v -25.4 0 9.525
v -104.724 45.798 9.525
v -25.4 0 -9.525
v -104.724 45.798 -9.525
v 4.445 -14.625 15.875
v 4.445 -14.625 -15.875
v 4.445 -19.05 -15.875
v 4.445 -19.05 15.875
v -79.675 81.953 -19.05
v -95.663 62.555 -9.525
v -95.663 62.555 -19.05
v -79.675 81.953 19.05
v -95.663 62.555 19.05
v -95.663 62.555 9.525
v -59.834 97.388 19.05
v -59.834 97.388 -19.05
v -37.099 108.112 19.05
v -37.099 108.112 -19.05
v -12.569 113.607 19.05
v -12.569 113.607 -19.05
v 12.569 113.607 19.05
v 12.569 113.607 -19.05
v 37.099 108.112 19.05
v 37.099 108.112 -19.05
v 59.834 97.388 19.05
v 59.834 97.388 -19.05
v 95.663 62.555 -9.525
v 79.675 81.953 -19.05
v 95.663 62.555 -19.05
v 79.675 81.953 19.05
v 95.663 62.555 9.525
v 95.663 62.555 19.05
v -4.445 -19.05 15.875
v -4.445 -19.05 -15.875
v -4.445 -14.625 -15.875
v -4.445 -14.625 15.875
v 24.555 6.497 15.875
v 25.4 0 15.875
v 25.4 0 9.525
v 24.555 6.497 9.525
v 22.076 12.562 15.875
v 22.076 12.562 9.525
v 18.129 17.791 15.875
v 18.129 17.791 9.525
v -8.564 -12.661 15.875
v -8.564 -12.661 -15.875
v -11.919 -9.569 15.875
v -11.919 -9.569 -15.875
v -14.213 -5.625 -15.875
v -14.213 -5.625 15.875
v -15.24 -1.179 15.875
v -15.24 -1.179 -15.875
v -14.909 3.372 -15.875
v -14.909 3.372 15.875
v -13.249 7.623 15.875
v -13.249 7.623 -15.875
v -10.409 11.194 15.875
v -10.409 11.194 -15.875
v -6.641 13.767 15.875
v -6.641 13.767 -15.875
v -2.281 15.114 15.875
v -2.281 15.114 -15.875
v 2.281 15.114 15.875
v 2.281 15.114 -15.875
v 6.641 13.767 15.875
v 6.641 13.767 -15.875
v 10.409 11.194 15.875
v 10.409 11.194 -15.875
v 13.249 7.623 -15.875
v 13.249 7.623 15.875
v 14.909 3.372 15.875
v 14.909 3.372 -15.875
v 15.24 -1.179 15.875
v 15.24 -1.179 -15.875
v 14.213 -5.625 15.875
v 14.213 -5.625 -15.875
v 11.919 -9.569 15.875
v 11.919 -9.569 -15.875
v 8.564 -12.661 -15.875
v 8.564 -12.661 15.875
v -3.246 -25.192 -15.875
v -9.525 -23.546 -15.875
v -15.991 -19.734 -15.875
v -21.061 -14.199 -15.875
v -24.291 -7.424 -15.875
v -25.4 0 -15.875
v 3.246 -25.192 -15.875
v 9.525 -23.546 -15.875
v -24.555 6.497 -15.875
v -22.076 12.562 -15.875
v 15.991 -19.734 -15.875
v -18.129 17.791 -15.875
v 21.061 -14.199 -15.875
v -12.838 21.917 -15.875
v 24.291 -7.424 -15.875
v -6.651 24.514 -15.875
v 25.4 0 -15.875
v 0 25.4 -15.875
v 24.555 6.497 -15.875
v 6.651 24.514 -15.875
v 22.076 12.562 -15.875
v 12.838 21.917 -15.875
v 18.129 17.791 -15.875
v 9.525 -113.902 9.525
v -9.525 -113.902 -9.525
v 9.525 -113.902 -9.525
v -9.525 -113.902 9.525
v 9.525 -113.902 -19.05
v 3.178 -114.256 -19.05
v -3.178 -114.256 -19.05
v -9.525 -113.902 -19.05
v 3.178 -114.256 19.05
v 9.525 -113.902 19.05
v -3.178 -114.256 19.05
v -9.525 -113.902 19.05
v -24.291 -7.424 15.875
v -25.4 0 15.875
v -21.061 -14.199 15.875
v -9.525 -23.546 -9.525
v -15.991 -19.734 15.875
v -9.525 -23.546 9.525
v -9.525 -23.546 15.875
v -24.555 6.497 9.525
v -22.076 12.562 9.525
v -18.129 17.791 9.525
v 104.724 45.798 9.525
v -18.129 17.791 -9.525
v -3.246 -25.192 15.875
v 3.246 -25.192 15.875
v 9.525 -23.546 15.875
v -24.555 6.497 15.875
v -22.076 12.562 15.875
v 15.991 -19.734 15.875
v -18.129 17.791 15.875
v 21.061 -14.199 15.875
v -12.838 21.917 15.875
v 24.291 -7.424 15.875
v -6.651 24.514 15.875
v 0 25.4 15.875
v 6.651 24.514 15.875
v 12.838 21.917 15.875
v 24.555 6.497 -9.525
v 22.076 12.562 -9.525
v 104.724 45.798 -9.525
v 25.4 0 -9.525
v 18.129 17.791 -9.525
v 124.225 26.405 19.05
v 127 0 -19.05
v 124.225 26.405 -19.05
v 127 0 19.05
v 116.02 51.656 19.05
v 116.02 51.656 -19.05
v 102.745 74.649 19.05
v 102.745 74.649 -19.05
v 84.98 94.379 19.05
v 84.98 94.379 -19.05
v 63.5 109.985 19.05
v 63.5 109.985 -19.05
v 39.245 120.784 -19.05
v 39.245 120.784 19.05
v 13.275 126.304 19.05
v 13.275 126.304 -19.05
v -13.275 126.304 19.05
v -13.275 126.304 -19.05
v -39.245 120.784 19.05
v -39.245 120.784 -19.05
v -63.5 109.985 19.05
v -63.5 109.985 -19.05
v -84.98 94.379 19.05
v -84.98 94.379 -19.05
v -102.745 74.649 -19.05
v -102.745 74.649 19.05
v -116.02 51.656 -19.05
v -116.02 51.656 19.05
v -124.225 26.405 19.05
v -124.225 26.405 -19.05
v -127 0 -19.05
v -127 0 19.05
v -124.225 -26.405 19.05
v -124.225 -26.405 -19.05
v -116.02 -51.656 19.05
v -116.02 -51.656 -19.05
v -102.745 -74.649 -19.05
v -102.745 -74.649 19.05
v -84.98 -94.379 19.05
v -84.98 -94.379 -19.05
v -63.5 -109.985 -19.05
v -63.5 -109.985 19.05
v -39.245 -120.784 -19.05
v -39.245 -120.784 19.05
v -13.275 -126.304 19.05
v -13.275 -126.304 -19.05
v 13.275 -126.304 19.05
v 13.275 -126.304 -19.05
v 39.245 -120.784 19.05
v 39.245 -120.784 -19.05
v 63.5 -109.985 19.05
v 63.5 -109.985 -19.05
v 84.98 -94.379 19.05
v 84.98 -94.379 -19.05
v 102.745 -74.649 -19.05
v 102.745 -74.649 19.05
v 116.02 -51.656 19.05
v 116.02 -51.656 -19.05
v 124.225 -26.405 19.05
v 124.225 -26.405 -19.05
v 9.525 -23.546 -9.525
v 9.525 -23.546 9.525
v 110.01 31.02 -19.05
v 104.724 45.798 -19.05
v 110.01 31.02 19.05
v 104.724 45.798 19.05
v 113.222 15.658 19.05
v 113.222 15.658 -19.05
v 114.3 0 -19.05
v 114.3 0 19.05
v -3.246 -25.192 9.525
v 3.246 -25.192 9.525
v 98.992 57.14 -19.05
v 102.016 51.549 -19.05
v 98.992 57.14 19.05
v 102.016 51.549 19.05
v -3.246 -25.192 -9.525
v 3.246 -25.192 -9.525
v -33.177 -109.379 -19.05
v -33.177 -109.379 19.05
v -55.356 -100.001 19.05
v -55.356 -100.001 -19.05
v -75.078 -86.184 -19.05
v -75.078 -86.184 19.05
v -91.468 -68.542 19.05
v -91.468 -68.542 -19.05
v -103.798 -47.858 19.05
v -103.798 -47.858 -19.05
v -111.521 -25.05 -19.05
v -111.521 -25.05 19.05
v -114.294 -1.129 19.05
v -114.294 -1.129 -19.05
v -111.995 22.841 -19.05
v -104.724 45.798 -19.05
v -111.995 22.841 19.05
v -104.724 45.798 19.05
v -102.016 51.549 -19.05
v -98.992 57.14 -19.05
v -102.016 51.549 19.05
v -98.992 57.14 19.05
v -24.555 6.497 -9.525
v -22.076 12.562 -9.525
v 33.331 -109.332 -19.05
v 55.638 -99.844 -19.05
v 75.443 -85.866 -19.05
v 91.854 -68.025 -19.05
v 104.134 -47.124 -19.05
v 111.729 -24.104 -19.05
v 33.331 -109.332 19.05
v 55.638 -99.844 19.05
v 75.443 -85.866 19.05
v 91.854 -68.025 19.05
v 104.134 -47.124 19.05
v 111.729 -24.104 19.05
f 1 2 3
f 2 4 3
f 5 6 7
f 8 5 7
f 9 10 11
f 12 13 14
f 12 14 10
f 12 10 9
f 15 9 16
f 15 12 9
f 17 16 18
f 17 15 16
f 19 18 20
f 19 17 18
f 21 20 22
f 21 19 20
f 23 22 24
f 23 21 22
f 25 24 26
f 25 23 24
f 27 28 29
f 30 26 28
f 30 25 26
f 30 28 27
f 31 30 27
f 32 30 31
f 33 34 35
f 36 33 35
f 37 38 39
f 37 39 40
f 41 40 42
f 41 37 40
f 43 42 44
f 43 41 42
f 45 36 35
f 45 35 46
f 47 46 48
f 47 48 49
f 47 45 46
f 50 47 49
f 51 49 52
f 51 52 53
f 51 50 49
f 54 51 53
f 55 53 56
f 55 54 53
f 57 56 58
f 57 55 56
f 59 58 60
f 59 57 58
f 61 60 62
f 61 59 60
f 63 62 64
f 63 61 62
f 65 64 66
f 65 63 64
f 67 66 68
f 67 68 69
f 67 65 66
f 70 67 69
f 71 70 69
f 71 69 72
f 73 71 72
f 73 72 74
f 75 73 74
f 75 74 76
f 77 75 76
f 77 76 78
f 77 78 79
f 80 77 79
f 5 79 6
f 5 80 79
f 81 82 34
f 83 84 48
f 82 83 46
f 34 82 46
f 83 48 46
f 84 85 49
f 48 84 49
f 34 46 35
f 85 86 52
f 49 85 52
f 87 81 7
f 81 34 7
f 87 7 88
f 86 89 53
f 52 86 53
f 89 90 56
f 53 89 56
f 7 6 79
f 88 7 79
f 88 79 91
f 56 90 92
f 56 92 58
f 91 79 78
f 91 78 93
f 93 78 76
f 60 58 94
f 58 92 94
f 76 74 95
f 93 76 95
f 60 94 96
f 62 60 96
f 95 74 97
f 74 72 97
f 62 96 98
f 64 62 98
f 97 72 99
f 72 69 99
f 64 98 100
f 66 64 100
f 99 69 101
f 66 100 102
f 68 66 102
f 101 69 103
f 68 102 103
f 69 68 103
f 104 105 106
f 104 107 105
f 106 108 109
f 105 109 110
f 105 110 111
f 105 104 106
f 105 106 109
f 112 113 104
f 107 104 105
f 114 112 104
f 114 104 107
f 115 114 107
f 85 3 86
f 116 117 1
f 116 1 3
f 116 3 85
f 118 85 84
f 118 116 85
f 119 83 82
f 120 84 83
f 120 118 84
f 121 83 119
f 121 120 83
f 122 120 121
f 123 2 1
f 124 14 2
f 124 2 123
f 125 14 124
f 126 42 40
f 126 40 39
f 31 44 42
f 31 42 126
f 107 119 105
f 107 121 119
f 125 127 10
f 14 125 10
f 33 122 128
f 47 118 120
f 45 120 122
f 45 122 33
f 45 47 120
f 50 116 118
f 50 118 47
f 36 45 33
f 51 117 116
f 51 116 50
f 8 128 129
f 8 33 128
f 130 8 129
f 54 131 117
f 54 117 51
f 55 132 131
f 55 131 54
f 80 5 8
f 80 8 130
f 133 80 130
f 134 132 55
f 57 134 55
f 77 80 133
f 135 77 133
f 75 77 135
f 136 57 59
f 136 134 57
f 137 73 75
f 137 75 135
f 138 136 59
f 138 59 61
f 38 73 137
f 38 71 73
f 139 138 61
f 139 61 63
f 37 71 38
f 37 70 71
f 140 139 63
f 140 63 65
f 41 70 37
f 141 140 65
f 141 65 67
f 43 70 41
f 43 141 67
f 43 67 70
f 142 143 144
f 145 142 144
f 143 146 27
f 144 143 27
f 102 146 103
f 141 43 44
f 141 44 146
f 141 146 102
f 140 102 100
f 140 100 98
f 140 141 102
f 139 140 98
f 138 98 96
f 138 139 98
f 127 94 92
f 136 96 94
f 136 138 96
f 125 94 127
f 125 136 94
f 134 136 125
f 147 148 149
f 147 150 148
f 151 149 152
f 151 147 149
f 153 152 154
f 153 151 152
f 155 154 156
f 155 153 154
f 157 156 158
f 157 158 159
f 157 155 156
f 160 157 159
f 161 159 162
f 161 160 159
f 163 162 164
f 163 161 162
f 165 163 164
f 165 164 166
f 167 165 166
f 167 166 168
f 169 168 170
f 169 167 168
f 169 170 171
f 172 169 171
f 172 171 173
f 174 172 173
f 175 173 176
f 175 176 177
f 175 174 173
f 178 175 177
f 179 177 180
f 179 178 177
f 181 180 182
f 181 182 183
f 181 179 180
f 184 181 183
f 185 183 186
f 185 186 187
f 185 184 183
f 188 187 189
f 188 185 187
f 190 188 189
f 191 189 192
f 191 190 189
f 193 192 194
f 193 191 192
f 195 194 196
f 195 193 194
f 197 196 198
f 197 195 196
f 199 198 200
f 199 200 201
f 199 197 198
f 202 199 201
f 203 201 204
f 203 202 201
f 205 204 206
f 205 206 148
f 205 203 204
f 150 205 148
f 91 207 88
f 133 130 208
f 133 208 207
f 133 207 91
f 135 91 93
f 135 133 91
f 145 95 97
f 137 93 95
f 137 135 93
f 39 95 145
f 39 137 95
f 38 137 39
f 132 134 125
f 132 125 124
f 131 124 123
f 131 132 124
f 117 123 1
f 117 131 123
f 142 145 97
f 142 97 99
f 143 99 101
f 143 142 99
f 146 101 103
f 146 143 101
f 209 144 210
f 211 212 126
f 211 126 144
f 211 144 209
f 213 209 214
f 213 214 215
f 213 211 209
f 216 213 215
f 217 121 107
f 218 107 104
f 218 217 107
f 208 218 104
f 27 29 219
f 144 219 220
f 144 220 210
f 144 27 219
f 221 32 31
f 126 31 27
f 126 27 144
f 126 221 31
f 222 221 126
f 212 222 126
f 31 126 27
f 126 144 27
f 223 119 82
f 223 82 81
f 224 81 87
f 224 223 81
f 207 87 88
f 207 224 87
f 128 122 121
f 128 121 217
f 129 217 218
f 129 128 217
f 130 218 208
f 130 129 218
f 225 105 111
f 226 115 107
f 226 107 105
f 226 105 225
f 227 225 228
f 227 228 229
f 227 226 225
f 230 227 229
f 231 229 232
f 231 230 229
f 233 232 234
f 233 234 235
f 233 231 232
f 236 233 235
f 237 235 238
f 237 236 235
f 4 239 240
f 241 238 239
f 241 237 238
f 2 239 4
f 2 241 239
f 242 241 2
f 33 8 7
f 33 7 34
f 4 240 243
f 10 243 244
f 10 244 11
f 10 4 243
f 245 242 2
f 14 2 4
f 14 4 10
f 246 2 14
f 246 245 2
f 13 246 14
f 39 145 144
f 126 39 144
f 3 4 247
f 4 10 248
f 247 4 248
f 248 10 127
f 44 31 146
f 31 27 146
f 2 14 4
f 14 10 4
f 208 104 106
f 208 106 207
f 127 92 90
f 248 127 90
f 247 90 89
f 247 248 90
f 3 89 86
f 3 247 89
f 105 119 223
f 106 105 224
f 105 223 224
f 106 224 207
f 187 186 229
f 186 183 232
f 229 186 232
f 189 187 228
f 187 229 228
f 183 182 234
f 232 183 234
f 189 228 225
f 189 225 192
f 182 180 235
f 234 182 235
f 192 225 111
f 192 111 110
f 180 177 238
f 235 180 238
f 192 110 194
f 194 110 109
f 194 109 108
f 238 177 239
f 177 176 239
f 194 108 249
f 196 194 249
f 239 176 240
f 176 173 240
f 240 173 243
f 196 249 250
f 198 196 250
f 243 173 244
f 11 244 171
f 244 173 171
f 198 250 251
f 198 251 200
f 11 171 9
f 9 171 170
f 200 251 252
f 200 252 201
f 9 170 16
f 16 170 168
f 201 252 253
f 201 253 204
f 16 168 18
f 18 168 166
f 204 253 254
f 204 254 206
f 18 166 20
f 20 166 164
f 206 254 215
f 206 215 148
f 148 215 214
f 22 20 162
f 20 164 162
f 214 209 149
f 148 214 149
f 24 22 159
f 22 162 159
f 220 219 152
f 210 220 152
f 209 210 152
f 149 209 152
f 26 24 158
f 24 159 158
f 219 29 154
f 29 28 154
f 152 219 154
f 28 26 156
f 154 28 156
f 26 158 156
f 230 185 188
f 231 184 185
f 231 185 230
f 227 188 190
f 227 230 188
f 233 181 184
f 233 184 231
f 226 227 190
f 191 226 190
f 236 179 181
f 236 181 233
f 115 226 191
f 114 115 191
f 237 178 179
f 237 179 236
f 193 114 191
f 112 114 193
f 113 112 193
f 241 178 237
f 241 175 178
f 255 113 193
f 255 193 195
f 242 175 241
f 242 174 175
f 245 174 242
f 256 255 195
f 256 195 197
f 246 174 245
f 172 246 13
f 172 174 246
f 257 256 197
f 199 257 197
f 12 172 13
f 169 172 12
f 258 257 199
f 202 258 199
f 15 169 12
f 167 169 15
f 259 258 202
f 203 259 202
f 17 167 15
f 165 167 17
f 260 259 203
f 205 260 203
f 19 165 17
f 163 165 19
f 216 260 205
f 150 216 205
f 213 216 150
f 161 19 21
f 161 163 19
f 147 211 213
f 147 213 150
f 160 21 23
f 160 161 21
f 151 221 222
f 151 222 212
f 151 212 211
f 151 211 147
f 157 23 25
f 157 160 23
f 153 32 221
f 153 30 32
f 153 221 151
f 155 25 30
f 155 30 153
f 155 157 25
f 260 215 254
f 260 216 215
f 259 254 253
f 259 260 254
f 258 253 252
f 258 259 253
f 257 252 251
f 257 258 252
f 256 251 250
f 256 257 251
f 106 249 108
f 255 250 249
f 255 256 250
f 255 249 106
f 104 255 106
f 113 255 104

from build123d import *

# Parameters (mm, degrees)
F0_R     = 127
F1_DEPTH = 19.05
F2_DEPTH = 15.875
F3_DEPTH = 9.525


with BuildPart() as f1:
    # F0 (on Top) → F1 (new body, symmetric)
    with BuildSketch(Plane.XY):
        Circle(F0_R)
        with BuildLine():
            ThreePointArc((104.723777, 45.797604), (111.880333, 23.394041), (114.3, 0))
            ThreePointArc((114.3, 0), (84.122522, -77.381466), (9.525, -113.902434))
            ThreePointArc((9.525, -113.902434), (0, -114.3), (-9.525, -113.902434))
            ThreePointArc((-9.525, -113.902434), (-98.179536, -58.525795), (-104.723777, 45.797604))
            ThreePointArc((-104.723777, 45.797604), (-100.543052, 54.365289), (-95.662896, 62.554779))
            ThreePointArc((-95.662896, 62.554779), (0, 114.3), (95.662896, 62.554779))
            ThreePointArc((95.662896, 62.554779), (100.543052, 54.365289), (104.723777, 45.797604))
        make_face(mode=Mode.SUBTRACT)
    extrude(amount=F1_DEPTH, both=True)



with BuildPart() as f2:
    # F0 (on Top) → F2 (new body, symmetric)
    with BuildSketch(Plane.XY):
        with BuildLine():
            ThreePointArc((9.525, -23.54643), (21.060567, -14.199032), (25.4, 0))
            Line((25.4, 0), (18.128915, 17.790515))
            ThreePointArc((18.128915, 17.790515), (0, 25.4), (-18.128915, 17.790515))
            Line((-18.128915, 17.790515), (-25.4, 0))
            ThreePointArc((-25.4, 0), (-21.060567, -14.199032), (-9.525, -23.54643))
            Line((-9.525, -23.54643), (9.525, -23.54643))
        make_face()
        with BuildLine():
            ThreePointArc((-4.445, -14.624876), (0, 15.285452), (4.445, -14.624876))
            Line((4.445, -14.624876), (4.445, -19.05))
            Line((4.445, -19.05), (-4.445, -19.05))
            Line((-4.445, -19.05), (-4.445, -14.624876))
        make_face(mode=Mode.SUBTRACT)
        with BuildLine():
            Line((-25.4, 0), (-18.128915, 17.790515))
            ThreePointArc((-18.128915, 17.790515), (-23.512066, 9.609515), (-25.4, 0))
        make_face()
        with BuildLine():
            Line((18.128915, 17.790515), (25.4, 0))
            ThreePointArc((25.4, 0), (23.512066, 9.609515), (18.128915, 17.790515))
        make_face()
        with BuildLine():
            ThreePointArc((-9.525, -23.54643), (0, -25.4), (9.525, -23.54643))
            Line((9.525, -23.54643), (-9.525, -23.54643))
        make_face()
    extrude(amount=F2_DEPTH, both=True)


with BuildPart() as f1_1:
    add(f1.part)

    add(f2.part)  # F3 merges F2
    # F0 (on Top) → F3 (join, symmetric)
    with BuildSketch(Plane.XY):
        with BuildLine():
            Line((-18.128915, 17.790515), (-95.662896, 62.554779))
            Line((-95.662896, 62.554779), (-104.723777, 45.797604))
            Line((-104.723777, 45.797604), (-25.4, 0))
            ThreePointArc((-25.4, 0), (-23.512066, 9.609515), (-18.128915, 17.790515))
        make_face()
        with BuildLine():
            Line((25.4, 0), (104.723777, 45.797604))
            Line((104.723777, 45.797604), (95.662896, 62.554779))
            Line((95.662896, 62.554779), (18.128915, 17.790515))
            ThreePointArc((18.128915, 17.790515), (23.512066, 9.609515), (25.4, 0))
        make_face()
        with BuildLine():
            Line((-9.525, -113.902434), (9.525, -113.902434))
            Line((9.525, -113.902434), (9.525, -23.54643))
            ThreePointArc((9.525, -23.54643), (0, -25.4), (-9.525, -23.54643))
            Line((-9.525, -23.54643), (-9.525, -113.902434))
        make_face()
    extrude(amount=F3_DEPTH, both=True)


solid = f1_1.part
